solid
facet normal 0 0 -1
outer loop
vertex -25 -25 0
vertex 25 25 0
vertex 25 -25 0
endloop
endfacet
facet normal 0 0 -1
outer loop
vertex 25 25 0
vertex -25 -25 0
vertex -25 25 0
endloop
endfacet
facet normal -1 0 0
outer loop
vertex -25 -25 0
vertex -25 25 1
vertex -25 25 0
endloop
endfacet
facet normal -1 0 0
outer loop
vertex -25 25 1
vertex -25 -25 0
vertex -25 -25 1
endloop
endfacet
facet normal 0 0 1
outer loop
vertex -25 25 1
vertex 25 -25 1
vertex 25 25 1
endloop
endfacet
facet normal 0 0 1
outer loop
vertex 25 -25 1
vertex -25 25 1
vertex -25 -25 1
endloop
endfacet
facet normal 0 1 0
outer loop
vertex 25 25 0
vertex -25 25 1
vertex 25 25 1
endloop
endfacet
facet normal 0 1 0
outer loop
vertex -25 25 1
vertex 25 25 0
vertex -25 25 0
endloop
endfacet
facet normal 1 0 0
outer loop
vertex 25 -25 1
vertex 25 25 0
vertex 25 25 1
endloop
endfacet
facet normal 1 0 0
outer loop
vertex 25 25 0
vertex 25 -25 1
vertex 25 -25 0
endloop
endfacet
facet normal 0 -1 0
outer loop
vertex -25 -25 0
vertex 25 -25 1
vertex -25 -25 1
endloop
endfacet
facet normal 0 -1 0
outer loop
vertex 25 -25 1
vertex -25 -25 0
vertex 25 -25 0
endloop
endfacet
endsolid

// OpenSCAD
/* ---------------------------------------------------------------------------
   AprilTag 36h11 renderer -- turns a decoded tag id into the two solids a
   multi-material printer needs for a clean one-pass two-color print: no
   glue, no manual filament swap, no finishing step. Meant to be `use`d from
   another design (e.g. apriltag_corner_mount.scad) alongside its own
   `color()` calls, not run standalone.

   Bit data comes from `apriltags-36h11-1-499.scad` (generated by
   apriltag-gen's `export-scad`, ids 1..499, TAG_36H11_BITS[id] indexed
   directly by id -- index 0 is an empty placeholder, not a real tag). That
   data is the interior payload only (6x6), 0 = black, 1 = white, border
   already excluded -- see apriltag_gen/tags.py's payload_bits() docstring.

   AprilTag convention, per Aaron 2026-09-28: the black portion is raised --
   the fixed one-module black border ring plus every payload cell whose bit
   is 0. The border ring itself carries no per-tag data (moms_apriltag's
   output has it solid black for every id in every 36h11 tag), so it is
   drawn from geometry alone, not from the bit array.

   Two solids, not one, and never unioned with each other -- this is what
   makes a colored 3MF export possible at all:
     - `april_tag_base()` -- the white background plate, the full edge x edge
       square, Z in [0, thickness]. Does not depend on the tag id.
     - `april_tag_pattern()` -- the raised black layer: border ring + payload
       cells where bit == 0, Z in [thickness, thickness + raise_h], sharing
       a flush face with the base's top (no gap, no overlap).

   Coordinate convention: centred on X = Y = 0 in the tag's own plane, Z = 0
   at the base's underside. Module grid: n = payload width + 2 (border on
   both sides) = 8 for 36h11.

   Verification: orientation (which corner is which) is exactly the kind of
   silently-wrong-not-loud risk this project's governing principle warns
   about, so it does not stop at "the file parses." Checked for id 1 by
   exporting `april_tag_pattern()` alone to STL and testing point containment
   (trimesh) at each of the 8x8 cell centres against tags.py's own
   tag_bits('tag36h11', 1) -- an exact match, border and all, not just a
   visual eyeball. Re-run that check if this file's row/col mapping, or the
   payload-vs-border split, ever changes.

   REV 1.0: initial. First draft unioned a difference()-built border frame
     with the payload cells as siblings before extruding; that union()
     silently dropped the frame entirely (confirmed by isolating it -- the
     frame alone rendered fine, but as soon as it was union()'d with even
     one sibling square, it vanished from the CGAL render with no warning or
     error). Reworked so the black area is a single difference(): the full
     square minus only the white cells, since the border ring, being outside
     the payload's row/col range, is never subtracted and stays solid with
     no separate frame primitive needed.
   --------------------------------------------------------------------------- */

include <apriltags-36h11-0-586.scad>

/* [Tag] */
tag_id   = 1;    // which 36h11 id to preview  [1:499]
tag_edge = 50;   // outer black-square width, mm -- matches apriltag-gen's own --size convention
thickness = 1.0; // base plate height, mm  [0.4:0.1:3]
raise_h   = 0.6; // raised black layer height above the base, mm  [0.2:0.1:2]

/* [Colors] */
base_color  = "White";
raise_color = "Black";

/* [Render] */
$fn = $preview ? 16 : 32;
eps = 0.01;

// ---------------------------------------------------------------------------

module april_tag_base(edge = tag_edge, thickness = thickness) {
    linear_extrude(thickness)
        square(edge, center = true);
}

module april_tag_pattern(id = tag_id, edge = tag_edge, thickness = thickness, raise_h = raise_h) {
    bits = TAG_36H11_BITS[id];
    n    = len(bits) + 2;
    cell = edge / n;

    translate([0, 0, thickness])
        linear_extrude(raise_h)
            translate([-edge / 2, -edge / 2])
                // Black area = the full square minus the white cells only.
                // The border ring is outside the payload's row/col range, so
                // it is never subtracted and stays solid automatically -- no
                // separate frame primitive needed. (A union() of a
                // difference()-built frame with sibling squares was tried
                // first and silently dropped the frame entirely; this
                // single-difference form sidesteps that.)
                difference() {
                    square(edge);
                    // payload cells where the bit is 1 (white); row 0 is the
                    // tag's own top row as generated, placed toward +Y here
                    for (row = [0 : len(bits) - 1], col = [0 : len(bits[0]) - 1])
                        if (bits[row][col] == 1)
                            translate([(col + 1) * cell, (n - 2 - row) * cell])
                                square(cell);
                }
}

module april_tag(id = tag_id, edge = tag_edge, thickness = thickness, raise_h = raise_h,
                  base_color = base_color, raise_color = raise_color) {
    // standalone preview only -- a real two-color export colours the two
    // halves at the call site instead, see the file header
    color(base_color)  april_tag_base(edge = edge, thickness = thickness);
    color(raise_color) april_tag_pattern(id = id, edge = edge, thickness = thickness, raise_h = raise_h);
}

april_tag();
